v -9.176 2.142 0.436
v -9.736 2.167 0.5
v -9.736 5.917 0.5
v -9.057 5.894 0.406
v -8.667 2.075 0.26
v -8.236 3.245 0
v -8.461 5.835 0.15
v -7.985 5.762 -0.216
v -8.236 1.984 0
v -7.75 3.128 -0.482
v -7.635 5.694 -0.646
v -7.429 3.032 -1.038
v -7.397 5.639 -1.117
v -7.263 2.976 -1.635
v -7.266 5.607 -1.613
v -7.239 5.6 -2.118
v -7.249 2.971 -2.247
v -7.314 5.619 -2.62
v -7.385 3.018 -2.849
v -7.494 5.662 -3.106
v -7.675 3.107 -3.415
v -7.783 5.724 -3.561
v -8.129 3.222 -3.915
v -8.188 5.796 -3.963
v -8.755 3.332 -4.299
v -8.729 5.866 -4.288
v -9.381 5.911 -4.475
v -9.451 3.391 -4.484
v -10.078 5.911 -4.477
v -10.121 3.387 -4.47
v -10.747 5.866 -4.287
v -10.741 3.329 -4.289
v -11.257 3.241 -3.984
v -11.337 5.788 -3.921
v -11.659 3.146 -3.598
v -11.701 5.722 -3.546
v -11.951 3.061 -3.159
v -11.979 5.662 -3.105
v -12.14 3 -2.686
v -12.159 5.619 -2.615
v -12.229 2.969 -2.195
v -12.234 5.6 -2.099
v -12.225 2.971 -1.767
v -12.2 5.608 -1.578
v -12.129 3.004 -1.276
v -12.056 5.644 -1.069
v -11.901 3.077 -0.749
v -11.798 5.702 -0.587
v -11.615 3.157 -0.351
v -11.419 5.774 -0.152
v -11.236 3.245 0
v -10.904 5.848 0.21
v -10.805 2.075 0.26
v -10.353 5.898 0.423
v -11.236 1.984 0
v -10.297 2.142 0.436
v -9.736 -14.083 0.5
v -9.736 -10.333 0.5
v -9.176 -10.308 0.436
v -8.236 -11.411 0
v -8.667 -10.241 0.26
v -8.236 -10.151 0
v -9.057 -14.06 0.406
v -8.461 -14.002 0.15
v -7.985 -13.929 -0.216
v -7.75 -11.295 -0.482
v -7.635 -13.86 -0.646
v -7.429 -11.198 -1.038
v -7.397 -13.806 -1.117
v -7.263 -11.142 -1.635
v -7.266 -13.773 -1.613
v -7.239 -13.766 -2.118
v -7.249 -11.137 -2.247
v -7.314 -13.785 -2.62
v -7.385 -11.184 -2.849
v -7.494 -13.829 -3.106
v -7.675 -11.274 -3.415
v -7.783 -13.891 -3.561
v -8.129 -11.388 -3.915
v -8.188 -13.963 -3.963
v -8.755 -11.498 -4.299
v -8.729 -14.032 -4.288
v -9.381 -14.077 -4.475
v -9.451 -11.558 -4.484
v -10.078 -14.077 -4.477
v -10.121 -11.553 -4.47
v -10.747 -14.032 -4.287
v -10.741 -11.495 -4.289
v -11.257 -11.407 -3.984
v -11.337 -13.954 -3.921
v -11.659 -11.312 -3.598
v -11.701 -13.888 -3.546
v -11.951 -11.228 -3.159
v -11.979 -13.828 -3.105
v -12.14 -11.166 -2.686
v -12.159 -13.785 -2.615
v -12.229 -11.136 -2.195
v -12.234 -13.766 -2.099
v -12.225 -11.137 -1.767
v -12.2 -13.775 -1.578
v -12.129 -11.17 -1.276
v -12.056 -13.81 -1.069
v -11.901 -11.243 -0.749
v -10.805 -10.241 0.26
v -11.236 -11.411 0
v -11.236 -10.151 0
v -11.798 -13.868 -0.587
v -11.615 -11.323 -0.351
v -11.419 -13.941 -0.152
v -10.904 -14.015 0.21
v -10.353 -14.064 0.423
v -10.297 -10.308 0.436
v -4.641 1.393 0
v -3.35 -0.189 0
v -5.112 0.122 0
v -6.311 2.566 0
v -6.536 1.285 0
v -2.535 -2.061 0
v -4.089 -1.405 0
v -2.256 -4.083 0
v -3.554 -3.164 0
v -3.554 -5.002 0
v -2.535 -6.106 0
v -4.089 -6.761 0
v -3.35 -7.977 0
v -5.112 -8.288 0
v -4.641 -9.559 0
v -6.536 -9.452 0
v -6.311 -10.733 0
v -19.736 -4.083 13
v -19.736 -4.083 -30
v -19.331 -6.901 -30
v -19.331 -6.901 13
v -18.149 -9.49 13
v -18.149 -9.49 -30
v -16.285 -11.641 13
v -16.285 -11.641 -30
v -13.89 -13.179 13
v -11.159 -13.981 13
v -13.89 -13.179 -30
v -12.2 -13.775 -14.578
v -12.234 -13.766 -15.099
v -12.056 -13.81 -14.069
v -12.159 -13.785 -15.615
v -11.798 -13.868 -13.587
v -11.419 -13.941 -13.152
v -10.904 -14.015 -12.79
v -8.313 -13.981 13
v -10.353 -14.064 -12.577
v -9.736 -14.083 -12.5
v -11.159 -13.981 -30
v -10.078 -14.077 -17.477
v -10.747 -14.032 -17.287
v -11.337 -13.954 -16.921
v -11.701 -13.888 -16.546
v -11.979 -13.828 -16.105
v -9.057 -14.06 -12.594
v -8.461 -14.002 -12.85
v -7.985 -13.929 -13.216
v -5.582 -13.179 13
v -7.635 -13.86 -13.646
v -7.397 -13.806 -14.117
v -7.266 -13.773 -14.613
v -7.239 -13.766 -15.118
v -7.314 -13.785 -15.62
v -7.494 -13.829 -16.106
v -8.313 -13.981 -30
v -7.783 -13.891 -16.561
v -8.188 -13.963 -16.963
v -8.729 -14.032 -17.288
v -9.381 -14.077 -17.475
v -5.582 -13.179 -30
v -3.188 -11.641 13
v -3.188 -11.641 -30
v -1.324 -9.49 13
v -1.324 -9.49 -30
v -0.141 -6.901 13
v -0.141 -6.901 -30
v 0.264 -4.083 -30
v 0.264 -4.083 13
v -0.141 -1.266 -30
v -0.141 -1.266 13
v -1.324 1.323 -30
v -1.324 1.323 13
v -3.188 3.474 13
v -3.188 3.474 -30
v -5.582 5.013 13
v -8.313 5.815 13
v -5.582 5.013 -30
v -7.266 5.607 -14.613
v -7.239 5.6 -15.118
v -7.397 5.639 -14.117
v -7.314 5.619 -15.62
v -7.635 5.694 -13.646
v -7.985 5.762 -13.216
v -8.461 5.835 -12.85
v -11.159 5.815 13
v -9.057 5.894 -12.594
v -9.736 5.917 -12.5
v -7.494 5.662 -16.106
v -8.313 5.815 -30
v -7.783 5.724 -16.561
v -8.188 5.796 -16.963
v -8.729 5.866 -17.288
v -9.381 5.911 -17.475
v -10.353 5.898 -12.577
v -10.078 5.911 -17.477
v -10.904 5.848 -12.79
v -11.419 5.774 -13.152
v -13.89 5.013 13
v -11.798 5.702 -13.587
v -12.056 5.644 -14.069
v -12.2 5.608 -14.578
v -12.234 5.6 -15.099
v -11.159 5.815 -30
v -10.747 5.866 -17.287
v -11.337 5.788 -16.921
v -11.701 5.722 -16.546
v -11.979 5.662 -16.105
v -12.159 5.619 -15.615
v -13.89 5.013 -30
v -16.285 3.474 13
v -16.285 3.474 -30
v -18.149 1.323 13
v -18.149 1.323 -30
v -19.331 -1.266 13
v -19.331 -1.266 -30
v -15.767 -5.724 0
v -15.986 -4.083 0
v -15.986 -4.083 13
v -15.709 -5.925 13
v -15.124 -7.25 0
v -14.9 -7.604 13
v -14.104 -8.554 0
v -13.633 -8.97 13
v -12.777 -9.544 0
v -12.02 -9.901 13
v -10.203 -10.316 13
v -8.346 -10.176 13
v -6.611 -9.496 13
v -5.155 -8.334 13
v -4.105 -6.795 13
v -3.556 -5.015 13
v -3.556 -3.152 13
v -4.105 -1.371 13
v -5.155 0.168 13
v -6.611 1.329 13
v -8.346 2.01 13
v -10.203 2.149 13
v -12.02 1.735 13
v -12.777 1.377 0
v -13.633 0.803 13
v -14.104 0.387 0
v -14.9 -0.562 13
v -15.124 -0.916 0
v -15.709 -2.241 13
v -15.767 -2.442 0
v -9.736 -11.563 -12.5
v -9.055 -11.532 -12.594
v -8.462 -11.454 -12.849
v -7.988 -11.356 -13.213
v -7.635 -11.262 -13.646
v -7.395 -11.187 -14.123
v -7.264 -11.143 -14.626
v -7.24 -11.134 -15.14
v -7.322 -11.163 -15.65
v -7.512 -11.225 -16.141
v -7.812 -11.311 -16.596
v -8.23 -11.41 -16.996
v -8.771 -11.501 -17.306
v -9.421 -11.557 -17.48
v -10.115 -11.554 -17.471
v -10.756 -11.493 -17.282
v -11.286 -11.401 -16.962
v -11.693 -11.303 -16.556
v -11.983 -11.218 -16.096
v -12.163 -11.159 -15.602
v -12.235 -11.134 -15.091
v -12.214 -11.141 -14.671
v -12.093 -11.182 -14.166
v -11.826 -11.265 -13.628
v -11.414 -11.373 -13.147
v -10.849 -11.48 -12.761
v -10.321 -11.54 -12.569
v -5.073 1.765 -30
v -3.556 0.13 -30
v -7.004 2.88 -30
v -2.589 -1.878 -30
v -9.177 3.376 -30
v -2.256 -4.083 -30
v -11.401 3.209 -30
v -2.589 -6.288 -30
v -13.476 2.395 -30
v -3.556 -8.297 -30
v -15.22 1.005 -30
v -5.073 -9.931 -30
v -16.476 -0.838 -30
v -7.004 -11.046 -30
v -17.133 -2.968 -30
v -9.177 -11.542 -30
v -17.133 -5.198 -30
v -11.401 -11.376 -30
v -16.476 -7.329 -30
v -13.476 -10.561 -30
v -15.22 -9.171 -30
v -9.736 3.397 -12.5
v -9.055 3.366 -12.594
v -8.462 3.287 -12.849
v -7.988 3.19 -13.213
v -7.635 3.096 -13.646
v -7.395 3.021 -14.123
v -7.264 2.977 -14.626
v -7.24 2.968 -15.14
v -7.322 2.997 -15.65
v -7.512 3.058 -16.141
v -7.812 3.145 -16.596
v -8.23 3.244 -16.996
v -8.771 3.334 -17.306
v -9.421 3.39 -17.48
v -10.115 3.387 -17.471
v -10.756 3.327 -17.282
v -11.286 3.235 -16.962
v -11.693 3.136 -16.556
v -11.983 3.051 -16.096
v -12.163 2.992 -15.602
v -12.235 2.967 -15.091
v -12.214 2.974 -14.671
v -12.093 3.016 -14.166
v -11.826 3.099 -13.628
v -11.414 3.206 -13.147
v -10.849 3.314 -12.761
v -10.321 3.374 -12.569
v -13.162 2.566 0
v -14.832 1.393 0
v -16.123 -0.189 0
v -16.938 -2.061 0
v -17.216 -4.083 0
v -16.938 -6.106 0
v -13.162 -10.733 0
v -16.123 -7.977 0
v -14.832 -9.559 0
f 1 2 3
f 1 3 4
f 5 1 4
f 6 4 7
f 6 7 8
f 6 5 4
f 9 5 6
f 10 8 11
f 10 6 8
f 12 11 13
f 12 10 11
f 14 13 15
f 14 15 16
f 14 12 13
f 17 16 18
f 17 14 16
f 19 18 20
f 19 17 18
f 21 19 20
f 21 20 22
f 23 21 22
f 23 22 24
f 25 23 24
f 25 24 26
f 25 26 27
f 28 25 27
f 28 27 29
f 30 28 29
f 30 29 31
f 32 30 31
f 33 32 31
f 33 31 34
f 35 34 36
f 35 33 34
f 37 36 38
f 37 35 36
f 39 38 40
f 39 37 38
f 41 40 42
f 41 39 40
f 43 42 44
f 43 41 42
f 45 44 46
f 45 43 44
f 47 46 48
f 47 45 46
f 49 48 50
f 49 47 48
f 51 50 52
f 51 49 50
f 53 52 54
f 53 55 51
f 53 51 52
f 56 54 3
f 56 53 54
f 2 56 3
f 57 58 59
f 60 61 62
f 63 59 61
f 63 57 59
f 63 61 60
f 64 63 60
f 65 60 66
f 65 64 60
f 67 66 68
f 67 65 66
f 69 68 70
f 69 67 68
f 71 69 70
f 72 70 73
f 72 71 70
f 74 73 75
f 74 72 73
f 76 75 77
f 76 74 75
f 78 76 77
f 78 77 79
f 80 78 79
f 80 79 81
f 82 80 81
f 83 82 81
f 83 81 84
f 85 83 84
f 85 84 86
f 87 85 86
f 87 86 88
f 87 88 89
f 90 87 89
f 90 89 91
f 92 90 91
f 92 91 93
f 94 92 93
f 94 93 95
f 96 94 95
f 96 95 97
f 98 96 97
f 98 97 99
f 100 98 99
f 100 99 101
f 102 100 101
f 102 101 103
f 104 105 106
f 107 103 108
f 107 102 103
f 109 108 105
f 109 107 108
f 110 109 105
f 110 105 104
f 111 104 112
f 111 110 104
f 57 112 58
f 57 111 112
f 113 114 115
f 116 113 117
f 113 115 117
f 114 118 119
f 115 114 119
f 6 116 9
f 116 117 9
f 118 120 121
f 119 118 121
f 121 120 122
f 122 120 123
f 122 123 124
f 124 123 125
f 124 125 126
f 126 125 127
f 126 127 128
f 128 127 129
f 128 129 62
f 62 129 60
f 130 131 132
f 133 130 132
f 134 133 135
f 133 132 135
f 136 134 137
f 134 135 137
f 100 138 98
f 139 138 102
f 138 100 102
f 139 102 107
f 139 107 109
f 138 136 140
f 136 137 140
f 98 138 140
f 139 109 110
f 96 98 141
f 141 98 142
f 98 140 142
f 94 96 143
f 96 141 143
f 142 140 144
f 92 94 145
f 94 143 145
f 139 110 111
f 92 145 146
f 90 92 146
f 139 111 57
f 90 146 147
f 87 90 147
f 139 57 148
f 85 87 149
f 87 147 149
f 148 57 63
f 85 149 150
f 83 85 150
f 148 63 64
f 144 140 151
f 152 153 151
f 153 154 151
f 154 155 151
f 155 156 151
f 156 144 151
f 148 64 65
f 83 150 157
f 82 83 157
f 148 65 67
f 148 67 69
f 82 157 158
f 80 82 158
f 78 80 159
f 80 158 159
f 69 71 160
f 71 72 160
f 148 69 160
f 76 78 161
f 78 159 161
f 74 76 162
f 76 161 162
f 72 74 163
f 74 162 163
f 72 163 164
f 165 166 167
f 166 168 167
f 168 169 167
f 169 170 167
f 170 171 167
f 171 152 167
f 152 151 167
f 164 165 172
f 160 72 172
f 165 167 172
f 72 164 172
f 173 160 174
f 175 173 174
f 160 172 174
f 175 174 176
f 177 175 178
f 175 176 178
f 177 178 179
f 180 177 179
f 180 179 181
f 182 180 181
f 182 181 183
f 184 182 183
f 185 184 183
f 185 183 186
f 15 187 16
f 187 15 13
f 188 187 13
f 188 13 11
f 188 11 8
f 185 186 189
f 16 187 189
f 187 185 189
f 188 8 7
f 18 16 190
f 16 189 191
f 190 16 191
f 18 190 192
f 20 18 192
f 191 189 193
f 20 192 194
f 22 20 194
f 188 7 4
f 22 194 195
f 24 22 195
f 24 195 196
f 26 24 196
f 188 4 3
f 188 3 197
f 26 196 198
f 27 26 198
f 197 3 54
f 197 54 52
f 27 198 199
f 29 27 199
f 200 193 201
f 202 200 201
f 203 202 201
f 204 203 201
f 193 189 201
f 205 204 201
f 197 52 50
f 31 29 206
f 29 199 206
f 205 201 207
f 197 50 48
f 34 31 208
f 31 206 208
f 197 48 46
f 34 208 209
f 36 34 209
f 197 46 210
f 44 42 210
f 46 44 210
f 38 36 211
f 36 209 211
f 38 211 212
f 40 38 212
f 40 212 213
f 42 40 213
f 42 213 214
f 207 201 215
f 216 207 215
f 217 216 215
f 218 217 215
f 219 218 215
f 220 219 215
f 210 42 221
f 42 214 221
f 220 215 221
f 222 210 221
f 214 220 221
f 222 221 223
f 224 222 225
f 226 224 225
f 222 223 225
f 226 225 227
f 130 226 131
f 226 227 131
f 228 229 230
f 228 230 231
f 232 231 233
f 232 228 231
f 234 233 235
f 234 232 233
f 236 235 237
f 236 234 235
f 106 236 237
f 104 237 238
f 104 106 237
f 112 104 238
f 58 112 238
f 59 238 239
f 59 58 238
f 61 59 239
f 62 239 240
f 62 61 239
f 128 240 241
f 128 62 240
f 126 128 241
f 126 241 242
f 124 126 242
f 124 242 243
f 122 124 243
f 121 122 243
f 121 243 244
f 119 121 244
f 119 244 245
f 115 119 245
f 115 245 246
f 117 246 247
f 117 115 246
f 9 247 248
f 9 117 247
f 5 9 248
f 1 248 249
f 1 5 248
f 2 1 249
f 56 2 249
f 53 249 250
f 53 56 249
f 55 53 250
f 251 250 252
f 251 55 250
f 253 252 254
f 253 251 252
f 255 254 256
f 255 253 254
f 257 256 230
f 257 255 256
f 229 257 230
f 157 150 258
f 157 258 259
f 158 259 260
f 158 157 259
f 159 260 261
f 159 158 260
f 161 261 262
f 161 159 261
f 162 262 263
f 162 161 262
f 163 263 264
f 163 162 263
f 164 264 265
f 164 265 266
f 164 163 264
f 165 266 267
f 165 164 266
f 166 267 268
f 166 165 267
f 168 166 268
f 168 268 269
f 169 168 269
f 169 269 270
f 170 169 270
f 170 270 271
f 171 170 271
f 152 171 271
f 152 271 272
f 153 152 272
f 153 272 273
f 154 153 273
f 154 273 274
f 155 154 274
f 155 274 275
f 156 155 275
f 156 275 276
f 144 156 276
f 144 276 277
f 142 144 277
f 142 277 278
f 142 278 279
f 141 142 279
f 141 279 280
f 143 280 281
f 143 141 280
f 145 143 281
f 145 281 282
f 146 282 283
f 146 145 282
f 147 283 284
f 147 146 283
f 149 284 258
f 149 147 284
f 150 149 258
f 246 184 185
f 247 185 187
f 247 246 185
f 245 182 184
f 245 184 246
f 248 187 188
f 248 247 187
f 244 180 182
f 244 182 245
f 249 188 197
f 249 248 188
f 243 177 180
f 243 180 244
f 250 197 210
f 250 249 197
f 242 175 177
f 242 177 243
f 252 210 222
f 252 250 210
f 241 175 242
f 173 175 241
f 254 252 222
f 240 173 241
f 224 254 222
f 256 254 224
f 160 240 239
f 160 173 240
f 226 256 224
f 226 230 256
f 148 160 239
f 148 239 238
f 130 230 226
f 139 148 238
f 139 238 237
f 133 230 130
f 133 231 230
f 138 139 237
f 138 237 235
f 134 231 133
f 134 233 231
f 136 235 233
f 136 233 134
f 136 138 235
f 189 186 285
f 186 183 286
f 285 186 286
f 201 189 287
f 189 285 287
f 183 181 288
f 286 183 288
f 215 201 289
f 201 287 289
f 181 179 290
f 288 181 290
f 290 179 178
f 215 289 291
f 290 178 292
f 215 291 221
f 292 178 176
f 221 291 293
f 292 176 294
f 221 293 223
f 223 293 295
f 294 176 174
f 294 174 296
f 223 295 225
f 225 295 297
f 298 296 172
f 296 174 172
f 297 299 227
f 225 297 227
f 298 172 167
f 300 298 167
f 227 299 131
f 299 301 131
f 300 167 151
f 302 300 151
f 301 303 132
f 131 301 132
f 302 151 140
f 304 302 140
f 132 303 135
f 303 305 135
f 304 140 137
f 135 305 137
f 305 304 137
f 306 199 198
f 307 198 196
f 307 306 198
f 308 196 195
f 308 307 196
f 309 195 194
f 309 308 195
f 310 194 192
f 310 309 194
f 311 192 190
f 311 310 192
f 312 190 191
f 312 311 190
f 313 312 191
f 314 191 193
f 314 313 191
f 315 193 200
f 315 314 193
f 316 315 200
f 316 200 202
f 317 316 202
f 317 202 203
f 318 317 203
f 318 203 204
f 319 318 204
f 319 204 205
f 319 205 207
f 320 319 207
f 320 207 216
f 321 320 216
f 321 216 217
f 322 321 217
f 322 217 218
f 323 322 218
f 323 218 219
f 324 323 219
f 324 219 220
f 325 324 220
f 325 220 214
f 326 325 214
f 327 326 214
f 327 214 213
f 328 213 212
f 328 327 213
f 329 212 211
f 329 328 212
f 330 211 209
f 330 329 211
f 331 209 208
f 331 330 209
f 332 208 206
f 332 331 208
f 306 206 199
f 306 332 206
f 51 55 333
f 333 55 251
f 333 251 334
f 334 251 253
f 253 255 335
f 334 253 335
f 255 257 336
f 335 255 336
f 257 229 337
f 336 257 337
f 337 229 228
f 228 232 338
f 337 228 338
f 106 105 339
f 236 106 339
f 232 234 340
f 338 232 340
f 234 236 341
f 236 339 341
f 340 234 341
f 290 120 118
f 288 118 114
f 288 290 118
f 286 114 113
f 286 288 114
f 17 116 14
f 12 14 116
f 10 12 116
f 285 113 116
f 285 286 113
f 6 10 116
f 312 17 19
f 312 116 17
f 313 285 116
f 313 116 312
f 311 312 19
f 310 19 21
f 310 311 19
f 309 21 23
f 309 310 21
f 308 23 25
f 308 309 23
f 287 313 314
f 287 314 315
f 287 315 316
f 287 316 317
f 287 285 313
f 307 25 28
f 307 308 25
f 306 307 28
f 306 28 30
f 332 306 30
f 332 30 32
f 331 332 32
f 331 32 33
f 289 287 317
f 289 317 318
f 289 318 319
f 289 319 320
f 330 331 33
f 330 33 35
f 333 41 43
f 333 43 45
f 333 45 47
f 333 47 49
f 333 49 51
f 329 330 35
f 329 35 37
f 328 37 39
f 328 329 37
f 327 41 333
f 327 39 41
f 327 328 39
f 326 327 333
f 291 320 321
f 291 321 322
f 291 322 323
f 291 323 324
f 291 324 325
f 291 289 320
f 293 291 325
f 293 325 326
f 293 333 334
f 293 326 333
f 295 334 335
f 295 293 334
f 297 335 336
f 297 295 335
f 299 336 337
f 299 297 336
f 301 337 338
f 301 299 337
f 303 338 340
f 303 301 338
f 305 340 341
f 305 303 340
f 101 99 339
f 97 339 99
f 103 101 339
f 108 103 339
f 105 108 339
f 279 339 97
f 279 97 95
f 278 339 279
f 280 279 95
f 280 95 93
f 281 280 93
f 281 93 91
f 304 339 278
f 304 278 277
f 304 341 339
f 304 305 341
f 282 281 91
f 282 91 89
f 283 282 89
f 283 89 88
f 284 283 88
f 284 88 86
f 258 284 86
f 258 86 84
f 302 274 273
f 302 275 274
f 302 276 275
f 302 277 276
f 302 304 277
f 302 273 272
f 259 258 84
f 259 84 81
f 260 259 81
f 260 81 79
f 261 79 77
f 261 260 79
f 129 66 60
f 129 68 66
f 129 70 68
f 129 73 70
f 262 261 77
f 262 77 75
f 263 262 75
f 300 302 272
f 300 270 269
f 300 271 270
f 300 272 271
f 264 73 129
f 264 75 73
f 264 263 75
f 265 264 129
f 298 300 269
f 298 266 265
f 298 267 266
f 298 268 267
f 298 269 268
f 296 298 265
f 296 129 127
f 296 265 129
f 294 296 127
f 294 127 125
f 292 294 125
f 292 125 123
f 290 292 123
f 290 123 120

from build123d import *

# Parameters (mm, degrees)
CROQUIS1_R                 = 10
CROQUIS1_R_2               = 6.25
SALIENTE_EXTRUIR1_DEPTH    = 13
SALIENTE_EXTRUIR2_START    = -30
CROQUIS2_R                 = 10
CROQUIS2_R_2               = 7.48
SALIENTE_EXTRUIR2_DEPTH    = 30
CORTAR_EXTRUIR1_DEPTH      = 39.57274278
CORTAR_EXTRUIR1_DEPTH_BACK = 39.57274278
CROQUIS3_R                 = 2.5


with BuildPart() as part:
    # Croquis1 → Saliente-Extruir1 (new body)
    with BuildSketch(Plane.XY):
        with Locations((-9.736276302, -4.083177315)):
            Circle(CROQUIS1_R)
        with Locations((-9.736276302, -4.083177315)):
            Circle(CROQUIS1_R_2, mode=Mode.SUBTRACT)
    extrude(amount=SALIENTE_EXTRUIR1_DEPTH)

    # Croquis2 → Saliente-Extruir2 (add)
    with BuildSketch(Plane.XY.offset(SALIENTE_EXTRUIR2_START)):
        with Locations((-9.736276302, -4.083177315)):
            Circle(CROQUIS2_R)
        with Locations((-9.736276302, -4.083177315)):
            Circle(CROQUIS2_R_2, mode=Mode.SUBTRACT)
    extrude(amount=SALIENTE_EXTRUIR2_DEPTH)

    # Croquis3 → Cortar-Extruir1 (cut, two sides: drawn at the far end of the back side and taken through both)
    with BuildSketch(Plane(origin=(0, 0, 0), x_dir=(1, 0, 0), z_dir=(0, 1, 0)).offset(-CORTAR_EXTRUIR1_DEPTH_BACK)):
        with Locations((-9.736276302, 15)):
            Circle(CROQUIS3_R)
        with Locations((-9.736276302, 2)):
            Circle(CROQUIS3_R)
    extrude(amount=CORTAR_EXTRUIR1_DEPTH + CORTAR_EXTRUIR1_DEPTH_BACK, mode=Mode.SUBTRACT)


solid = part.part
